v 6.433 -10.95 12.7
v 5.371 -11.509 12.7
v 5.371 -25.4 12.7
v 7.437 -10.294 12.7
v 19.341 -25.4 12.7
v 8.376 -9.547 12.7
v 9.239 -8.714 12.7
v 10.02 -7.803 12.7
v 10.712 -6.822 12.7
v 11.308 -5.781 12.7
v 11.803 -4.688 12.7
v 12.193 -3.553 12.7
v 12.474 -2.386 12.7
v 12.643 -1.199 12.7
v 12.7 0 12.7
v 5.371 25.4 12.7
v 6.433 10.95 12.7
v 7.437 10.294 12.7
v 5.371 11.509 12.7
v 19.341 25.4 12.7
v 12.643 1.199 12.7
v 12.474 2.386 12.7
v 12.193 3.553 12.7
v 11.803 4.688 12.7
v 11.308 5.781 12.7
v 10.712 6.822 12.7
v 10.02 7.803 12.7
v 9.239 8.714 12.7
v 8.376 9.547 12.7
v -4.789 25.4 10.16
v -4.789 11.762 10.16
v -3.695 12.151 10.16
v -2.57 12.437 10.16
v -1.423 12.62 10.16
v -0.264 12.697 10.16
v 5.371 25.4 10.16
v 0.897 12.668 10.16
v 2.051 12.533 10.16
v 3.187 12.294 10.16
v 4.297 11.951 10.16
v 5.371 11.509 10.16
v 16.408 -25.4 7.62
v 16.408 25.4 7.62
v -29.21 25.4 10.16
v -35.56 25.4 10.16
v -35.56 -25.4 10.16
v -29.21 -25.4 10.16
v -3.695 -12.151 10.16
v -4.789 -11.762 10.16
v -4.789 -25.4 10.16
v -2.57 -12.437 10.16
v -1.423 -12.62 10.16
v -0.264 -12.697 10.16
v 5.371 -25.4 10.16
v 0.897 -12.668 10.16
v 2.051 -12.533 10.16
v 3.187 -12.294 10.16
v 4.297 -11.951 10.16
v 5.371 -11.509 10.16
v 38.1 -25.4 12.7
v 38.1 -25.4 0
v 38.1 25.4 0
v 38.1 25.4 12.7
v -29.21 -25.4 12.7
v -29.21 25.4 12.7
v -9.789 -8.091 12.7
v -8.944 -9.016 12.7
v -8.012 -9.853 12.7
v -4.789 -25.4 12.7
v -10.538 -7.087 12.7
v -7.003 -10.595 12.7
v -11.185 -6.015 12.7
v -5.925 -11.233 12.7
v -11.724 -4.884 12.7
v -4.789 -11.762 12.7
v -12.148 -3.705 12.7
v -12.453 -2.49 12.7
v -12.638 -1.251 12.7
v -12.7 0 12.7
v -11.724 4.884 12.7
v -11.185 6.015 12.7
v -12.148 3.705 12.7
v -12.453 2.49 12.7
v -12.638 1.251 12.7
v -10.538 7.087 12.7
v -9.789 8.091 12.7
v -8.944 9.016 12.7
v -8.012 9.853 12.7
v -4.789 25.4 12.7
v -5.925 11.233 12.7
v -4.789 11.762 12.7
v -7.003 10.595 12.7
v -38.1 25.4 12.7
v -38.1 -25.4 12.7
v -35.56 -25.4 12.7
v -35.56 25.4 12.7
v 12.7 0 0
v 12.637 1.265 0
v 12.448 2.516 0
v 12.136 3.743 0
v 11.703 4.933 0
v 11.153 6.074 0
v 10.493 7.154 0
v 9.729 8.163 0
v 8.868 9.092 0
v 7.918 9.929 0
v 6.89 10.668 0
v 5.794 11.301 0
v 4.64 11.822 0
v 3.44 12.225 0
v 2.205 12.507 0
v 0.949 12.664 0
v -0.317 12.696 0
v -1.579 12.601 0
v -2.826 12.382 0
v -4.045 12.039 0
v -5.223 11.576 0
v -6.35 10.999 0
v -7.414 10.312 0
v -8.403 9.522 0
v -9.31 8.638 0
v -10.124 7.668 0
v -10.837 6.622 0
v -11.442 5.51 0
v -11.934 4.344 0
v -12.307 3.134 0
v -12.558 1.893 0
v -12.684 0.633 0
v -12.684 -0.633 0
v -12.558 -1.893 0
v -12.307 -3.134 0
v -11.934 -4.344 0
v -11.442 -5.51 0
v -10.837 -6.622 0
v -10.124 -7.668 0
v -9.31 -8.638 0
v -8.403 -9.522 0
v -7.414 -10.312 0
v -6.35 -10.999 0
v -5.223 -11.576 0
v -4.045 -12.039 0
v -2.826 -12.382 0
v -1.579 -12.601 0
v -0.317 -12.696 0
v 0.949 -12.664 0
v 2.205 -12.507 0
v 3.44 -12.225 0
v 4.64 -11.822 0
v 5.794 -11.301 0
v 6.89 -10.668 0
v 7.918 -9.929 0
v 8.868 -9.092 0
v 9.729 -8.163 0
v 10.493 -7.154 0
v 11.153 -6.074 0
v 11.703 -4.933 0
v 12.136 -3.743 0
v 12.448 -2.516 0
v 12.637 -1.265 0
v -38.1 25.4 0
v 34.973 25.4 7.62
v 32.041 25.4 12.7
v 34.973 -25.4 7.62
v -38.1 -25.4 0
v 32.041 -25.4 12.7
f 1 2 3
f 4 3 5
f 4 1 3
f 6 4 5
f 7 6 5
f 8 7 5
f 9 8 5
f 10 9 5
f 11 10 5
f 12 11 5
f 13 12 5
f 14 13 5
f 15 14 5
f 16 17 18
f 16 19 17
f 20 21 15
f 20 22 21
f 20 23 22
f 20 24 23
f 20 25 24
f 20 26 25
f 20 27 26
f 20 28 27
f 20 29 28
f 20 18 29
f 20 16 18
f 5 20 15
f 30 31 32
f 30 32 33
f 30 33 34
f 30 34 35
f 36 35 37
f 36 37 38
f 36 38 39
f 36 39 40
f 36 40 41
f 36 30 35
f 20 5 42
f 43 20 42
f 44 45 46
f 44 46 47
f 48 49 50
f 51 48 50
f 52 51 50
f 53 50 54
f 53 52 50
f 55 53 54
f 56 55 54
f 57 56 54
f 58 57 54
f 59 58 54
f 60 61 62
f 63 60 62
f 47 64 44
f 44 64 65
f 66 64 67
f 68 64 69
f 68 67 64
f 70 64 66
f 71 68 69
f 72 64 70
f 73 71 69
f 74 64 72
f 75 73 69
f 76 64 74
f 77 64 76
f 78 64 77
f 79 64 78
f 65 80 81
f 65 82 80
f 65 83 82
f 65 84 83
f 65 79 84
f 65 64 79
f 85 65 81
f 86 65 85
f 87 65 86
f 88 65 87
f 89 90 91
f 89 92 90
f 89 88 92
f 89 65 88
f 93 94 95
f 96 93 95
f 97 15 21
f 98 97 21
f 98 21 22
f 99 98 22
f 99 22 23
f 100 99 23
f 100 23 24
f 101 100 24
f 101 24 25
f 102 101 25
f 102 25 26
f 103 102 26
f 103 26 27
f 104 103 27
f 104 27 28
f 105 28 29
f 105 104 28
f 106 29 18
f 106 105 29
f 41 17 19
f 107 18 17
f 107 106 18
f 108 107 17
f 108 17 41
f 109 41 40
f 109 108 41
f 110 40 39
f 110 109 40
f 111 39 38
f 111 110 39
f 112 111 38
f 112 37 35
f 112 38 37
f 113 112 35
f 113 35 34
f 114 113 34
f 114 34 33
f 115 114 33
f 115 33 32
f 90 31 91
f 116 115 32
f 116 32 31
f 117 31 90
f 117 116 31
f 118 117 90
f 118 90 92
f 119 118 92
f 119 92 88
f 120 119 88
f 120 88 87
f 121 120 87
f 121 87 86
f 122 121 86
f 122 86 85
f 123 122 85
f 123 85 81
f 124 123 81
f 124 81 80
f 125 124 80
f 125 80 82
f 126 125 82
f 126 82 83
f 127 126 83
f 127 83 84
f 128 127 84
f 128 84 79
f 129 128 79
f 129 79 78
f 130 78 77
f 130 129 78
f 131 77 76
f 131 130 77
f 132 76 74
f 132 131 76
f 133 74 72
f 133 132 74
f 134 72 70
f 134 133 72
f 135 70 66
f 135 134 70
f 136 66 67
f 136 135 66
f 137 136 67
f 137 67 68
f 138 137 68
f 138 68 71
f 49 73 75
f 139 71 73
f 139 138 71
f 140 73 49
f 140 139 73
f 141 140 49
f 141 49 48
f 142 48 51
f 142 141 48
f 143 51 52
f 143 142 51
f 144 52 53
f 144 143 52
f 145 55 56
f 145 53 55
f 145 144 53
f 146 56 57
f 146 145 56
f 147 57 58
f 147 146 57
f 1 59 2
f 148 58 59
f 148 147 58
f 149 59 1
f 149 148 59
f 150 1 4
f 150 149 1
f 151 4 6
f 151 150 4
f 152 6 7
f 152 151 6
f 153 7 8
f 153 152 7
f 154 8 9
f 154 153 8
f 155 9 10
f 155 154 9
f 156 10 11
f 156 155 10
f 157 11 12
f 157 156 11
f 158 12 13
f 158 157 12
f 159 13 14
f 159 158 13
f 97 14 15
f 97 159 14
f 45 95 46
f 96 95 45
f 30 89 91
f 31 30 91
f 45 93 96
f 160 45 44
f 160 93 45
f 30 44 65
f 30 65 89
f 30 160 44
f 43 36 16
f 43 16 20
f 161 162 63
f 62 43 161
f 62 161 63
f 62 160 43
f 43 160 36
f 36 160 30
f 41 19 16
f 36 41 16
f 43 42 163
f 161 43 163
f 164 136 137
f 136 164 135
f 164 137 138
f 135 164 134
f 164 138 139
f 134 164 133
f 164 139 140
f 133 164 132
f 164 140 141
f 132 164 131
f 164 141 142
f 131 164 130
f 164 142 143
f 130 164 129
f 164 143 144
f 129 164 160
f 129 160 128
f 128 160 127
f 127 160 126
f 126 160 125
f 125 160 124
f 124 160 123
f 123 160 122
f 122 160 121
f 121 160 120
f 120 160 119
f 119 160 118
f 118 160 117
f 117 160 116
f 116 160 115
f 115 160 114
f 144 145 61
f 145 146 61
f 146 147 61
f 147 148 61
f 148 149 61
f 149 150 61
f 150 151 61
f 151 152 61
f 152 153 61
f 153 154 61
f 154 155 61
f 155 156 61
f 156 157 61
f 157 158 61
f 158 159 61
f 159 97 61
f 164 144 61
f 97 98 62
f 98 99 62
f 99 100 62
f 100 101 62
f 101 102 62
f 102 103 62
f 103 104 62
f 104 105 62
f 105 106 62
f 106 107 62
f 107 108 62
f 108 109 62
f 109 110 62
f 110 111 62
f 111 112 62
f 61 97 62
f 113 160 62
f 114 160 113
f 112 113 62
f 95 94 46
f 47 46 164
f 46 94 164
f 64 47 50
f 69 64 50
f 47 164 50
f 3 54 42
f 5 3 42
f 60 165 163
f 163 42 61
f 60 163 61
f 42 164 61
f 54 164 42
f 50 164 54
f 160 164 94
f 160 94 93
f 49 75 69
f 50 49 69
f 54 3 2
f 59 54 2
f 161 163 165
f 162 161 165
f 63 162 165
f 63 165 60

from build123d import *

# Parameters (mm, degrees)
F0_W     = 76.2
F0_H     = 50.8
F0_R     = 12.7
F1_DEPTH = 12.7
F2_W     = 6.35
F2_H     = 50.8
F3_DEPTH = 2.54
F5_DEPTH = 50.801


with BuildPart() as f1:
    # F0 (on Top) → F1 (new body)
    with BuildSketch(Plane.XY):
        Rectangle(F0_W, F0_H)
        Circle(F0_R, mode=Mode.SUBTRACT)
    extrude(amount=F1_DEPTH)

    # F2 (on face) → F3 (cut)
    with BuildSketch(Plane.XY.offset(12.7)):
        with Locations((-32.385, 0)):
            Rectangle(F2_W, F2_H)
        with BuildLine():
            Line((5.37053629, 25.4), (-4.78946371, 25.4))
            Line((-4.78946371, 25.4), (-4.78946371, 11.7622717776))
            ThreePointArc((-4.78946371, 11.7622717776), (0.3170199067, 12.6960426267), (5.37053629, 11.5085767999))
            Line((5.37053629, 11.5085767999), (5.37053629, 25.4))
        make_face()
        with BuildLine():
            Line((-4.78946371, -11.7622717776), (-4.78946371, -25.4))
            Line((-4.78946371, -25.4), (5.37053629, -25.4))
            Line((5.37053629, -25.4), (5.37053629, -11.5085767999))
            ThreePointArc((5.37053629, -11.5085767999), (0.3170199067, -12.6960426267), (-4.78946371, -11.7622717776))
        make_face()
    extrude(amount=-F3_DEPTH, mode=Mode.SUBTRACT)

    # F4 (on face) → F5 (cut, through all)
    with BuildSketch(Plane.XZ.offset(25.4)):
        Polygon((32.04053629, 12.7), (19.34053629, 12.7), (16.4075969225, 7.62), (34.9734756574, 7.62), align=None)
    extrude(amount=-F5_DEPTH, mode=Mode.SUBTRACT)


solid = f1.part
